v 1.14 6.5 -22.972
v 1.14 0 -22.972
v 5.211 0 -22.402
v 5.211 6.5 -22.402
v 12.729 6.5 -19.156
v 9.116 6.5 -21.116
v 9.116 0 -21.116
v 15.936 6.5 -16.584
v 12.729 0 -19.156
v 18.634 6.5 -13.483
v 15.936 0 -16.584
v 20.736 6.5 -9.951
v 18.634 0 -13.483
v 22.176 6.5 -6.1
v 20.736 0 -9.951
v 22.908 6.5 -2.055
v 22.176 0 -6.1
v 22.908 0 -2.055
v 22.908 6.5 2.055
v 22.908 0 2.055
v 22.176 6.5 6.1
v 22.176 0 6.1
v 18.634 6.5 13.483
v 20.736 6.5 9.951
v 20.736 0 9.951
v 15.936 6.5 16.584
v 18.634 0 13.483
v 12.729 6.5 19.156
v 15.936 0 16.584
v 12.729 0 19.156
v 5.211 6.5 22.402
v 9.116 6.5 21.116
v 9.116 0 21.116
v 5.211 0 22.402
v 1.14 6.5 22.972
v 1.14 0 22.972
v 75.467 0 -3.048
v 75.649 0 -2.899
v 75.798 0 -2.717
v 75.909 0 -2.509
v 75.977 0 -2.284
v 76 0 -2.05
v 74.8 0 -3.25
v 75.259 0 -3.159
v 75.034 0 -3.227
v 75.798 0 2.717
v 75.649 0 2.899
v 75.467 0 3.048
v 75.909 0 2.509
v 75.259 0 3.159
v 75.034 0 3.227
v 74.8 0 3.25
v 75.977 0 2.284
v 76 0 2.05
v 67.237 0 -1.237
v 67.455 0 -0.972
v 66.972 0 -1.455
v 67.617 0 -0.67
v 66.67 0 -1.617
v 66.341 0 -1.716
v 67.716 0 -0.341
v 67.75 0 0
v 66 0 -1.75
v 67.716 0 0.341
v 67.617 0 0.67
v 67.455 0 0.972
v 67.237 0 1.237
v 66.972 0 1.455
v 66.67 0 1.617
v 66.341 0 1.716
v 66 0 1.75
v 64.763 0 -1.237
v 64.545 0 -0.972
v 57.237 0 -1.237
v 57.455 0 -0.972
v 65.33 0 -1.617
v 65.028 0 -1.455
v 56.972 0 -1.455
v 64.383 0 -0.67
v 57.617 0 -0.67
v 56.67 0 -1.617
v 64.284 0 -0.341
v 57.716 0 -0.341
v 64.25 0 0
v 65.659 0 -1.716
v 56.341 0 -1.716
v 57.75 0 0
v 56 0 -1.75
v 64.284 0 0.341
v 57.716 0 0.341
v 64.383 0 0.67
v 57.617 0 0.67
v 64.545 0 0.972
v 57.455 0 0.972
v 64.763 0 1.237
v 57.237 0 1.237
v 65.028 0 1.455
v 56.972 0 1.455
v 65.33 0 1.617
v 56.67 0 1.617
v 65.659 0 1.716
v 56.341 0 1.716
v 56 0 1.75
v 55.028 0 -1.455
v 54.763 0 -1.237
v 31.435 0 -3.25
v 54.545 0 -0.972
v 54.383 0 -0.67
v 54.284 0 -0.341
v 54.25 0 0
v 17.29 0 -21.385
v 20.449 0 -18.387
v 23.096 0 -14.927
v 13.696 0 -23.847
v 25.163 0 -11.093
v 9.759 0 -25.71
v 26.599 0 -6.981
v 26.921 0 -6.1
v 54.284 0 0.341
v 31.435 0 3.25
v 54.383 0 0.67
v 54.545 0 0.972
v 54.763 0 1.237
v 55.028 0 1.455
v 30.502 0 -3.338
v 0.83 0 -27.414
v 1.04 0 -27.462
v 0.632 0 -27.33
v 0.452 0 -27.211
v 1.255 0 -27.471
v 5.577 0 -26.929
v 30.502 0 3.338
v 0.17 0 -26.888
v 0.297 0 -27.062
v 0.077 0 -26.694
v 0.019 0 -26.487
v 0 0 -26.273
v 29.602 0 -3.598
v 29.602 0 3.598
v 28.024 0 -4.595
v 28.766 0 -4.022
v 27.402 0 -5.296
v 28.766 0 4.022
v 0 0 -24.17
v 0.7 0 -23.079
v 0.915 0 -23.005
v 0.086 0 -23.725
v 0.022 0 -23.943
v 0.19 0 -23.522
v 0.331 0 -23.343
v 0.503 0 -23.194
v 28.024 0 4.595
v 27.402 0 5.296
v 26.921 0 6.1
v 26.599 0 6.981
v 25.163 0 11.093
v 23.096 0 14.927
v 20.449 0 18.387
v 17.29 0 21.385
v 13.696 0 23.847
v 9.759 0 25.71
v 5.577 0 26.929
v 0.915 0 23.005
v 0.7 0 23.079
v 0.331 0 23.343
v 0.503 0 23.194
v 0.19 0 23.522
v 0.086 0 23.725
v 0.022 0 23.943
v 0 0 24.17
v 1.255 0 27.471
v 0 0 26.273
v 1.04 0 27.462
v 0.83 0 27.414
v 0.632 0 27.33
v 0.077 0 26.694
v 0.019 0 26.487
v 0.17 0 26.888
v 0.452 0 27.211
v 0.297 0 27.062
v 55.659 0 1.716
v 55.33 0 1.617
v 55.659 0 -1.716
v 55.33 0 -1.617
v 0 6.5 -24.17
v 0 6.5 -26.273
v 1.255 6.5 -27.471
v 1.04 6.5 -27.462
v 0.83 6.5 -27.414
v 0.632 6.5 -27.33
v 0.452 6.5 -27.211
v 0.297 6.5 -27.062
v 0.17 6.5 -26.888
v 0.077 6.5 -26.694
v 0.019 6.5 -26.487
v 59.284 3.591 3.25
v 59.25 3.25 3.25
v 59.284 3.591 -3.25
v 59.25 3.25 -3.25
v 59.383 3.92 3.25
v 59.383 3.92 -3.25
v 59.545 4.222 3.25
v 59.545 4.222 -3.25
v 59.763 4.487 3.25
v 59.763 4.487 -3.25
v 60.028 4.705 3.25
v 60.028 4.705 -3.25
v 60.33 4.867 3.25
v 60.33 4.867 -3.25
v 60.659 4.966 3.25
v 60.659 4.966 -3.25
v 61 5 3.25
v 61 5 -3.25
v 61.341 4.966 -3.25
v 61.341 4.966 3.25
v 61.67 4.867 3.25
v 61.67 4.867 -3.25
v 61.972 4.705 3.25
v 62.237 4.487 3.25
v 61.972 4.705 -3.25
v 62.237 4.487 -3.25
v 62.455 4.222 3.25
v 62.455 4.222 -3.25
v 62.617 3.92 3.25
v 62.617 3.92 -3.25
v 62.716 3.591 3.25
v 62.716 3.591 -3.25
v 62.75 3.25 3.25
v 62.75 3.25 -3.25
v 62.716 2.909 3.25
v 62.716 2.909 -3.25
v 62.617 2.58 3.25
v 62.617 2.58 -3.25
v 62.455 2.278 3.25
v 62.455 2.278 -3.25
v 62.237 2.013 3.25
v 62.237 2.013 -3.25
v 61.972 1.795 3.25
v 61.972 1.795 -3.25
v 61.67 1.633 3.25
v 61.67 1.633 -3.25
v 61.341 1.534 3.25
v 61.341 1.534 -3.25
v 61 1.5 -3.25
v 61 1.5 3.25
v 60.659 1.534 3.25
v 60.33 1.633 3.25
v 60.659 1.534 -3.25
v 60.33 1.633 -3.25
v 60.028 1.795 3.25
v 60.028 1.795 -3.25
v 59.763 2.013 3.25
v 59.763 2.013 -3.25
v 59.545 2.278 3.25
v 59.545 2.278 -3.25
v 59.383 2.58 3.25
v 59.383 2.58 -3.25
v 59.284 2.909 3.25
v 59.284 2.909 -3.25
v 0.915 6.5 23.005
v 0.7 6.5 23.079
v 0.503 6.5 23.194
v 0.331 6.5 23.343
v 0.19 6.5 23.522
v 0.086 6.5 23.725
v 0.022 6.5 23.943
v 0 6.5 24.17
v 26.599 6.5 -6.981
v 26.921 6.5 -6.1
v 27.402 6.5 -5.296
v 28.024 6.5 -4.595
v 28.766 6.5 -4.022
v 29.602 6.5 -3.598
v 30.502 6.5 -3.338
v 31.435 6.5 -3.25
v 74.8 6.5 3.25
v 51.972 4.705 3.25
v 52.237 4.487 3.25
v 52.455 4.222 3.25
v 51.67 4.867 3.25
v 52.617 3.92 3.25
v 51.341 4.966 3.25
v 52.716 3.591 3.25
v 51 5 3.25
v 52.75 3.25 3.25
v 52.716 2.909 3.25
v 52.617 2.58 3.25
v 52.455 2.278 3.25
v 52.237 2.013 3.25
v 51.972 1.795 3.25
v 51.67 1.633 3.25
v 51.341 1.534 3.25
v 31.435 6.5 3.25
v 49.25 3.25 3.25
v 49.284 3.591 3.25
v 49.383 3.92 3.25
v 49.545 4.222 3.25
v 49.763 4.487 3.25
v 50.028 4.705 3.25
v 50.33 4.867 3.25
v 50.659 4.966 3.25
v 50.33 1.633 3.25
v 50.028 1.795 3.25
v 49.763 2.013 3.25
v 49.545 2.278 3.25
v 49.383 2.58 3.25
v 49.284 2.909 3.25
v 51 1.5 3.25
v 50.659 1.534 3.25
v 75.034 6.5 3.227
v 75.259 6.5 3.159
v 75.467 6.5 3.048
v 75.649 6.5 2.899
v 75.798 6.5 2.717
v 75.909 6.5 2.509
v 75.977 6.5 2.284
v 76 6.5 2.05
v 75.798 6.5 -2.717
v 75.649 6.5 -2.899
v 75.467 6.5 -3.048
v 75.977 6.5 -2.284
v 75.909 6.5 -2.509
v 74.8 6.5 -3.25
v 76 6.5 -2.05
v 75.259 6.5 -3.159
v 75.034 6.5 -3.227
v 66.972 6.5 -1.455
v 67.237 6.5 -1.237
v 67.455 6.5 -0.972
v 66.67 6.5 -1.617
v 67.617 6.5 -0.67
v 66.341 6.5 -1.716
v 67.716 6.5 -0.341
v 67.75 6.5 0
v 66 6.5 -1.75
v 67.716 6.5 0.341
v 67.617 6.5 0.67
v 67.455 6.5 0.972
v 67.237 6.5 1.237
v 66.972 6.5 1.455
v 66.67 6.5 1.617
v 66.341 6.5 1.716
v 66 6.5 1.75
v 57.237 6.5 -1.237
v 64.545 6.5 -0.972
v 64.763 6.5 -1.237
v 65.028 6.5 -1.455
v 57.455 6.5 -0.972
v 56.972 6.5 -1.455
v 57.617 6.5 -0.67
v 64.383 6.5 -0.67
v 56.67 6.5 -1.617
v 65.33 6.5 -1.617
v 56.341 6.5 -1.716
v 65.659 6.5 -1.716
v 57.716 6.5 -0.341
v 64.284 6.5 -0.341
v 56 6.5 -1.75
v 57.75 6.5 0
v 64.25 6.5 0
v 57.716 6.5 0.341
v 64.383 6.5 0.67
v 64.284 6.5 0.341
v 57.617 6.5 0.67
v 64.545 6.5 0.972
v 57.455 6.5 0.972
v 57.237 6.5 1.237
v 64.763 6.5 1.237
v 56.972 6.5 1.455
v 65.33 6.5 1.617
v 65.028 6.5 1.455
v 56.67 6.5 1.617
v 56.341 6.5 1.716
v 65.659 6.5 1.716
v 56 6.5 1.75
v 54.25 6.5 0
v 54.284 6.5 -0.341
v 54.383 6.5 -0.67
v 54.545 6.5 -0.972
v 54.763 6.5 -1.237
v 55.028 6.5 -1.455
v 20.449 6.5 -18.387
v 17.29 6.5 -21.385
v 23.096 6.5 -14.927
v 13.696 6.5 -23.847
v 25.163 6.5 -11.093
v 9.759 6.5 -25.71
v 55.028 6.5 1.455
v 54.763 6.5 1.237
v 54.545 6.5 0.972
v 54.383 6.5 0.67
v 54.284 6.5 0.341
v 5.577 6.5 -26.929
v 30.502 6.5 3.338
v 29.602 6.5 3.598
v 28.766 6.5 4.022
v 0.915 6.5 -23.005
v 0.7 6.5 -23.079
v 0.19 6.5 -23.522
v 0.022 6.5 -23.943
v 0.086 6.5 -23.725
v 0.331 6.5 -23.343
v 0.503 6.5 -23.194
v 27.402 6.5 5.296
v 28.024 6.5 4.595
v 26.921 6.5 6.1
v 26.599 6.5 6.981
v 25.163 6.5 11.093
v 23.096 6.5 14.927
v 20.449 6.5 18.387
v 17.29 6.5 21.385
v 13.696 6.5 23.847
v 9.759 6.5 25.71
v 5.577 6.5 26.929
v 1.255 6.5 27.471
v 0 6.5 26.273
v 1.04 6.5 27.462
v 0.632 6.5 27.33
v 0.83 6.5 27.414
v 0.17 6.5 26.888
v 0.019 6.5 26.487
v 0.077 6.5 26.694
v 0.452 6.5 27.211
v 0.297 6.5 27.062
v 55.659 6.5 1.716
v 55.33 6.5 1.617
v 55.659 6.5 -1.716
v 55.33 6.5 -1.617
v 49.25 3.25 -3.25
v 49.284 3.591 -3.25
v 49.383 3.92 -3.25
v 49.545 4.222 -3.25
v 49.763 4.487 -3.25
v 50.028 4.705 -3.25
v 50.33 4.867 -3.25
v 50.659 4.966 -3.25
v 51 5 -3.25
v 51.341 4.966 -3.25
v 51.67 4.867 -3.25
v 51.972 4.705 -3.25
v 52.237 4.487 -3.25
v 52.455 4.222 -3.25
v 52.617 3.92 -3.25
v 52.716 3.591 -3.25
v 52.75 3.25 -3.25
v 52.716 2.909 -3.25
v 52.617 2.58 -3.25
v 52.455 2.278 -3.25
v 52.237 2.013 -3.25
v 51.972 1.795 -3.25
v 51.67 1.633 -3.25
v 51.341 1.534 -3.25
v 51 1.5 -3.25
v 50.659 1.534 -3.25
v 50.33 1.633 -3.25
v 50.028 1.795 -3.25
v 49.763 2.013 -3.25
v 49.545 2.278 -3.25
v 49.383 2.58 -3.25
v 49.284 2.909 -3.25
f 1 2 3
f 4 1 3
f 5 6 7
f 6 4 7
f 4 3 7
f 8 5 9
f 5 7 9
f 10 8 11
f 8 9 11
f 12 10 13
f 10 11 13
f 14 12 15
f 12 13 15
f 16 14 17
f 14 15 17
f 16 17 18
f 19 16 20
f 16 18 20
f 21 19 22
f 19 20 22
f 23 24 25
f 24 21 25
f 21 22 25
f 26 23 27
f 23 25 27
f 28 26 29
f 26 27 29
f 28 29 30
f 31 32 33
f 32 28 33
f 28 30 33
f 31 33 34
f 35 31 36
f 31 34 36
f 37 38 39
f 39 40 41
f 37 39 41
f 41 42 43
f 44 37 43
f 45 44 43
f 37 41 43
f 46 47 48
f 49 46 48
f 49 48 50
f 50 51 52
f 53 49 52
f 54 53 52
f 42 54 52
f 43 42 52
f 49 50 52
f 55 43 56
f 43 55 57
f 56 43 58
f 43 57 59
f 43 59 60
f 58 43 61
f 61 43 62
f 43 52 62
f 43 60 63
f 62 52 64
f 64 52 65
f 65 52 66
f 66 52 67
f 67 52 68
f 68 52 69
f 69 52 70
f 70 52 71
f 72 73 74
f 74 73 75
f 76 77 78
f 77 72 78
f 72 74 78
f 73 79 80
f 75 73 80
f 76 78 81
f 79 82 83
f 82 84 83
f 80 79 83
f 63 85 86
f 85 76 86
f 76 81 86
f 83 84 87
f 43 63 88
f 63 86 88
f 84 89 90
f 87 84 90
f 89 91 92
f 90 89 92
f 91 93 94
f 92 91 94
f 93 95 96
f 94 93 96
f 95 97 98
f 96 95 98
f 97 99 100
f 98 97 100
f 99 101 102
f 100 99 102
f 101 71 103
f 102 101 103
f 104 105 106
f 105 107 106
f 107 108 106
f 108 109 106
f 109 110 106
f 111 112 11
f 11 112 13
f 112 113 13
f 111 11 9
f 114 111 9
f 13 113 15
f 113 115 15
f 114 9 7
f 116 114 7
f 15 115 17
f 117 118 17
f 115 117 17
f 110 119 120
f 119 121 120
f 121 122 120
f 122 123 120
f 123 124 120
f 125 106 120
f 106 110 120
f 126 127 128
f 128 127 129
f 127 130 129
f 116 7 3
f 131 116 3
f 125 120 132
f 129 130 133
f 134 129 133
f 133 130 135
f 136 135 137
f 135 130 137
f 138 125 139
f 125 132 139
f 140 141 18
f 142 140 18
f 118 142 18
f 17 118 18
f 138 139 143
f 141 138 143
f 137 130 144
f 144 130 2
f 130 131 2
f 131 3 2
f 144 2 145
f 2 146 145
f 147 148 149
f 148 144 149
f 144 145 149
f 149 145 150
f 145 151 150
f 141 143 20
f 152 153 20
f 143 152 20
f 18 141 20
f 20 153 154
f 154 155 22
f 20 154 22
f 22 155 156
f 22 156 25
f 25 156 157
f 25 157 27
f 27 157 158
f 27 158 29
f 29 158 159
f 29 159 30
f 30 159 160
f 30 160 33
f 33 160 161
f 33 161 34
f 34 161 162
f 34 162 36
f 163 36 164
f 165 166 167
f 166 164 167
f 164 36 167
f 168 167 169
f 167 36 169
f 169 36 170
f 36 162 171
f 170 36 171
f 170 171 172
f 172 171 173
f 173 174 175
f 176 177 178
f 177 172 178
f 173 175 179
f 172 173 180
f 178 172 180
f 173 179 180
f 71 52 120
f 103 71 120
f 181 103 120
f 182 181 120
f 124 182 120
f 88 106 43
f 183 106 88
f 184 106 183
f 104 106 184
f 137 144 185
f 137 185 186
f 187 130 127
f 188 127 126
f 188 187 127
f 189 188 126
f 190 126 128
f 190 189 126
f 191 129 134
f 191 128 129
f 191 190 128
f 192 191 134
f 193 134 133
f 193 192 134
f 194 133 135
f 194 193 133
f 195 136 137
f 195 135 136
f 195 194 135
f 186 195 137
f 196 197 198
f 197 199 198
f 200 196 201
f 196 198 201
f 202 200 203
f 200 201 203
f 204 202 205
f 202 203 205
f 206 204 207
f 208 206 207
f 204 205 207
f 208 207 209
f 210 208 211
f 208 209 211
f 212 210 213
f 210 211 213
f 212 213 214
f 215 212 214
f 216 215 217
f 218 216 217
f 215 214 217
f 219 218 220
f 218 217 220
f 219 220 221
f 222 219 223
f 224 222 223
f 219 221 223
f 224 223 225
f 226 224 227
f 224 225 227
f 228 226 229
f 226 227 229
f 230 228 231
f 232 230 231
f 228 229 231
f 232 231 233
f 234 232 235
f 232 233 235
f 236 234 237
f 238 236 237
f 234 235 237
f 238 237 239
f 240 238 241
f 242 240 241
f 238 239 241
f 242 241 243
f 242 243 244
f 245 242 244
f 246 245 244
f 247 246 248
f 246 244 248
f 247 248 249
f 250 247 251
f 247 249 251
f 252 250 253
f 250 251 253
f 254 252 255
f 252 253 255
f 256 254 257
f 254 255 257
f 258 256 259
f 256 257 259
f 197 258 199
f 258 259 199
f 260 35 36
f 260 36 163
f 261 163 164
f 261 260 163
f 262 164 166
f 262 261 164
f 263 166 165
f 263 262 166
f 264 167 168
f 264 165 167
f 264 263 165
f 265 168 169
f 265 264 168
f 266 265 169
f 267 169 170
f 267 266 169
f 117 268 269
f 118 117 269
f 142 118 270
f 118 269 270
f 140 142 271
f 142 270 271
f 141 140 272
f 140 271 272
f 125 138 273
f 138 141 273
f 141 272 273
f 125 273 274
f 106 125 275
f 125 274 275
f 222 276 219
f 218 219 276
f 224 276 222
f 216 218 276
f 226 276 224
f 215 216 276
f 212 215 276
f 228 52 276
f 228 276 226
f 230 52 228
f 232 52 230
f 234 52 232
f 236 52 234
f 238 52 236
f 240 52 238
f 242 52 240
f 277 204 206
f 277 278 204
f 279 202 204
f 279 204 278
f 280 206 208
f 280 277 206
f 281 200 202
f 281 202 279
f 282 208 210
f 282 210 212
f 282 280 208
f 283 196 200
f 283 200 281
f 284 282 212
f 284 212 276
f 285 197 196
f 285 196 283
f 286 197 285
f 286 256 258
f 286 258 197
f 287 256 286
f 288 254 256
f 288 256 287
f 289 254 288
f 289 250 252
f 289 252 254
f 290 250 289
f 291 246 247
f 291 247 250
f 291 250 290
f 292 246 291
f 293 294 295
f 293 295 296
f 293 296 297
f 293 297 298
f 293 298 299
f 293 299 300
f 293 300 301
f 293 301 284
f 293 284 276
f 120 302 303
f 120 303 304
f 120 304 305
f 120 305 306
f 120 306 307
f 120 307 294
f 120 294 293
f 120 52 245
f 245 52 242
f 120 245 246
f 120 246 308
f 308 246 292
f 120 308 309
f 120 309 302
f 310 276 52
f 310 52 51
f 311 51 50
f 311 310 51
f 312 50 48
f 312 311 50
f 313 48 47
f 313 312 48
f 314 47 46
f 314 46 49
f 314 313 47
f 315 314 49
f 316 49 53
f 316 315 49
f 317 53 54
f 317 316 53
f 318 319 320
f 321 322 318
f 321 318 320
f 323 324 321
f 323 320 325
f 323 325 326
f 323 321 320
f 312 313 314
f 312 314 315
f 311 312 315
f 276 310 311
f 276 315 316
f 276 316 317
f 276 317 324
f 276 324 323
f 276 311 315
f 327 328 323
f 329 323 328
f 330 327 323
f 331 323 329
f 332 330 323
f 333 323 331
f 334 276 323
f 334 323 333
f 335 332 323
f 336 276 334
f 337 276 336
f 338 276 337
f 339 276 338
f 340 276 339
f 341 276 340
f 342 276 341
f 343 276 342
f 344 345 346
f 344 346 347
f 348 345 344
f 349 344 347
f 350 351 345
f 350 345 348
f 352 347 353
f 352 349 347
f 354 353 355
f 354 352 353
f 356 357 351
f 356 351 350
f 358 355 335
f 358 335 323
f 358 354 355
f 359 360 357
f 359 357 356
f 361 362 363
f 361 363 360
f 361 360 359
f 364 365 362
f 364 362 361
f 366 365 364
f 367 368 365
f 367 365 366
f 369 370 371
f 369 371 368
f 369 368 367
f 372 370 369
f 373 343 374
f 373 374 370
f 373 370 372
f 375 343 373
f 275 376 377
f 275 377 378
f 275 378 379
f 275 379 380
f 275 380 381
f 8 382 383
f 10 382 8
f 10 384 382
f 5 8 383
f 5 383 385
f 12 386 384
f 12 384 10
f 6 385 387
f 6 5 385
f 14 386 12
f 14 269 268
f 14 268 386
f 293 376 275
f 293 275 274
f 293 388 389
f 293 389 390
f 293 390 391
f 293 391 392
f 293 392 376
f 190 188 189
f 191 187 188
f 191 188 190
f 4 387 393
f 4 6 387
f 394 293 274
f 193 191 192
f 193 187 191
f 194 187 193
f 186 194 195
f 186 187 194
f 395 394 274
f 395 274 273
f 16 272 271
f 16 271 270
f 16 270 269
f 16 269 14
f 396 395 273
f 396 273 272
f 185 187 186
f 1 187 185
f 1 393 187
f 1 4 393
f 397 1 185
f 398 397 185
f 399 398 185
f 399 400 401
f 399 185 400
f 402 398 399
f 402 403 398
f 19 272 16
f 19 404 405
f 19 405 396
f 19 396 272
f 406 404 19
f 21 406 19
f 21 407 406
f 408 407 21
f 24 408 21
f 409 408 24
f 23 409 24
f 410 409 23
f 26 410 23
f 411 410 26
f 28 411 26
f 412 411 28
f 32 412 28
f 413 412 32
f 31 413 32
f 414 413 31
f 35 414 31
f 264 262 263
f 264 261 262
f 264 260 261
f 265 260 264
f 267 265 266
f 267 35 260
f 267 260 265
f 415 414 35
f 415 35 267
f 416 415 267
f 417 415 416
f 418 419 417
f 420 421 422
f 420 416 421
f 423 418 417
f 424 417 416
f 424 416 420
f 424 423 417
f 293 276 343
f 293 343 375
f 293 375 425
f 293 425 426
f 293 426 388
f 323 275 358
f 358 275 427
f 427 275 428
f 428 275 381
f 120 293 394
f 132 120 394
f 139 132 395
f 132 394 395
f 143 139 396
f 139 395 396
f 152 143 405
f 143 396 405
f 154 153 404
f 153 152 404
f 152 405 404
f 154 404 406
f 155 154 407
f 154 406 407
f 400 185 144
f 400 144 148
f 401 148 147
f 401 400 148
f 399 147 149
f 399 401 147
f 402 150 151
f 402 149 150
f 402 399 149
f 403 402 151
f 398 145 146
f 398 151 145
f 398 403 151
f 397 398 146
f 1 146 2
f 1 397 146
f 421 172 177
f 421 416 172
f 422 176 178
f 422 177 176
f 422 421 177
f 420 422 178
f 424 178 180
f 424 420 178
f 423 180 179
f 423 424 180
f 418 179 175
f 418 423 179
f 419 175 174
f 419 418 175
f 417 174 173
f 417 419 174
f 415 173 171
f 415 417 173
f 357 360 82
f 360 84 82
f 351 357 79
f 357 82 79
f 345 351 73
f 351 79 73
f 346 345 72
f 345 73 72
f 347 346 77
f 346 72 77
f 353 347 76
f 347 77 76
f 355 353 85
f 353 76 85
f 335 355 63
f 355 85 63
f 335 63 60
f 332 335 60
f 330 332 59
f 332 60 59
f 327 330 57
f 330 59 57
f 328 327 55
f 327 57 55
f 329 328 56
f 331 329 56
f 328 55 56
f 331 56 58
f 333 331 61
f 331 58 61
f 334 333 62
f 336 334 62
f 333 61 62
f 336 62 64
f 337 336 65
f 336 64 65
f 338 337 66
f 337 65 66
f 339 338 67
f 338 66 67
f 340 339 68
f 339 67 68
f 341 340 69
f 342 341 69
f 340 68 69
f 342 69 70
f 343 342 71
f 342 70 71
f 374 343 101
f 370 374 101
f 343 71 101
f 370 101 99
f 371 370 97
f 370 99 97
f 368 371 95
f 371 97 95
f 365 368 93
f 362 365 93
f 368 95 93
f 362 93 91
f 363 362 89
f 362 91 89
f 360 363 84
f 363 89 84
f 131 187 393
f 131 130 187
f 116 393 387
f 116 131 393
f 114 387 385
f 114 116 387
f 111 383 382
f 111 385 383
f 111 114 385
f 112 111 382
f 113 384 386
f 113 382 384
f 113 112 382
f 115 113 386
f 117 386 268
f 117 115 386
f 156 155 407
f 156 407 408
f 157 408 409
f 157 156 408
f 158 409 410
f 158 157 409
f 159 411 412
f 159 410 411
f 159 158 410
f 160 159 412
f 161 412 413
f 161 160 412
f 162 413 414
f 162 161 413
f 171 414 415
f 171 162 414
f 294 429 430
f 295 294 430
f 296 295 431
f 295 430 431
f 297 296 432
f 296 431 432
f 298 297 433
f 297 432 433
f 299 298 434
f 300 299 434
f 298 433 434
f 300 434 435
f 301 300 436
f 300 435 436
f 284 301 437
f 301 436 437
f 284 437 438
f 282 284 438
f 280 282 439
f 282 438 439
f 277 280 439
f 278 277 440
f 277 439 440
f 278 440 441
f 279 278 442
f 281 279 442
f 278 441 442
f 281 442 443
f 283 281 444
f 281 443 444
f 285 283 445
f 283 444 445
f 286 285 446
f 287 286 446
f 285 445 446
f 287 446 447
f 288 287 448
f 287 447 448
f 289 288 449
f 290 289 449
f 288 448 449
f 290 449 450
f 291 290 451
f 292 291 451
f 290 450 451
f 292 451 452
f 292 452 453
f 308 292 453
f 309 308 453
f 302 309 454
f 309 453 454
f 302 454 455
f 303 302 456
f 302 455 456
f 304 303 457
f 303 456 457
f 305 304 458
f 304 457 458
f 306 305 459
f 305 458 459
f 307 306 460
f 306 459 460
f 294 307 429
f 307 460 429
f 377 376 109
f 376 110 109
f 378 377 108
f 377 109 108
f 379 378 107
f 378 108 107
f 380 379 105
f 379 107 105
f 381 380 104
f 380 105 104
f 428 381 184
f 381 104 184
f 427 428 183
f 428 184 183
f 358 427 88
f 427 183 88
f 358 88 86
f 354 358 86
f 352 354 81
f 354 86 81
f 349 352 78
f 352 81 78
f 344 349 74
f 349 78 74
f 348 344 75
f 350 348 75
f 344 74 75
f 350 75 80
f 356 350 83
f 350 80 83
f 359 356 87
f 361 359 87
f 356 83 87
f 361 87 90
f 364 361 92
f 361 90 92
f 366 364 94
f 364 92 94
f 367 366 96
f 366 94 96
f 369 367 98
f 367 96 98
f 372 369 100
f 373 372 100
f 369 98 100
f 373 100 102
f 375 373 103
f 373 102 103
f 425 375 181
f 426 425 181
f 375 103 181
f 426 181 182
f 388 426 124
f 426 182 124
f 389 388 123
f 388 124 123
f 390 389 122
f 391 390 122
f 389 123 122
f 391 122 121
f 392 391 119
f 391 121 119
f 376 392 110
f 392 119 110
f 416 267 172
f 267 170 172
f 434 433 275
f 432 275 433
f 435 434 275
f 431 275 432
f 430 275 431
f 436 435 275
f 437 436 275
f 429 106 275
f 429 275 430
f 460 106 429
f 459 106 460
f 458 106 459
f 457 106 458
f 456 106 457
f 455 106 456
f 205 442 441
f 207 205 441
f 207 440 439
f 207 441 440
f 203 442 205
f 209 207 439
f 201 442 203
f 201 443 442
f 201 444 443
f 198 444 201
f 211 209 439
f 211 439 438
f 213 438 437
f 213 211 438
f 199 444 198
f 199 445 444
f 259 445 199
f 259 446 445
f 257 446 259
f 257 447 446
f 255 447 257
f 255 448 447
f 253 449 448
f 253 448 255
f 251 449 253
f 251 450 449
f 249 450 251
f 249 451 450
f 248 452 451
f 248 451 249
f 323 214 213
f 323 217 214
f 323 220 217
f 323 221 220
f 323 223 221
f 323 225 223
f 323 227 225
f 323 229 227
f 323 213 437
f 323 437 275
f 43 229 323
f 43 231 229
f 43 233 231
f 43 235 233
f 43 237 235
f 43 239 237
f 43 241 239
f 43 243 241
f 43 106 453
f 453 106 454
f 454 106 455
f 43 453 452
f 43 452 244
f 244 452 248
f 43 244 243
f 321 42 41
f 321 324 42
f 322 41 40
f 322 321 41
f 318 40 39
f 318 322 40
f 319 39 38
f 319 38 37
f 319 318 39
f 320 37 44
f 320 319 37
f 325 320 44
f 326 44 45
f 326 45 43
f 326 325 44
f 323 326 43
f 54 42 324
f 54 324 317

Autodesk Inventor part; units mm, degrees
ref_plane "YZ Plane" through (0, 0, 0) normal (1, 0, 0) x (0, 1, 0)
ref_plane "XZ Plane" through (0, 0, 0) normal (0, 1, 0) x (-1, 0, 0)
ref_plane "XY Plane" through (0, 0, 0) normal (0, 0, 1) x (1, 0, 0)
sketch "Szkic1" plane through (0, 0, 0) normal (0, 1, 0) x (-1, 0, 0)
  circle A0 centre (0, 0) radius 23 construction
  arc A1 (0, 23) -> (0, -23) centre (0, 0) ccw
  line L0 (0, 23) -> (0, 27.5)
  line L1 (0, -23) -> (0, -27.5)
  line L2 (0, -38.5) -> (0, 38.5) projected
  arc A2 (0, 27.5) -> (0, -27.5) centre (0, 0) ccw
  line L3 (-76, 3.25) -> (-27.3073, 3.25)
  line L4 (-27.3073, 3.25) -> (-27.3073, -3.25) construction
  line L5 (-27.3073, -3.25) -> (-76, -3.25)
  line L6 (-76, -3.25) -> (-76, 3.25)
  line L7 (42.8, 0) -> (-95.8, 0) projected
  circle A3 centre (-66, 0) radius 1.75
  circle A4 centre (-56, 0) radius 1.75
  point P0 (-27.5, 0)
  point P1 (-23, 0)
  dimension "d0" = 46
  dimension "d1" = 4.5
  dimension "d2" = 4.5
  dimension "d3" = 6.5
  dimension "d4" = 76
  dimension "d5" = 3.5
  dimension "d6" = 10
  dimension "d7" = 10
extrude "Wyciągnięcie proste1" add sketch "Szkic1" along normal blind 6.5 contours A1 L7 A2 L0 | A1 L1 A2 L7 | L7 A4 A3 L6 L3 A2 | A2 L5 L6 L7 A3 A4
sketch "Szkic2" plane through (76, 0, -3.25) normal (0, 0, -1) x (-1, 0, 0)
  line L0 (0, 0) -> (48.6927, 0) projected
  line L1 (48.6927, 0) -> (48.6927, 6.5) projected
  line L2 (0, 6.5) -> (48.6927, 6.5) projected
  line L3 (0, 0) -> (0, 6.5) projected
  line L4 (48.6927, 0) -> (48.6927, 6.5) projected
  line L5 (48.6927, 3.25) -> (0, 3.25) construction
  circle A0 centre (15, 3.25) radius 1.75
  circle A1 centre (25, 3.25) radius 1.75
  point P0 (76, 0)
  dimension "d10" = 3.5
  dimension "d11" = 3.5
  dimension "d12" = 15
  dimension "d13" = 10
extrude "Wyciągnięcie proste2" cut sketch "Szkic2" against normal up to surface (6.5 mm away) contours A0 | A1
fillet "Zaokrąglenie1" radius 5 2 edges at (27.3073, 3.25, 3.25) (27.3073, 3.25, -3.25)
fillet "Zaokrąglenie2" radius 1.2 6 edges at (0, 3.25, 27.5) (0, 3.25, 23) (0, 3.25, -23) (0, 3.25, -27.5) (76, 3.25, 3.25) (76, 3.25, -3.25)
equation "\"d2\" = d1"
equation "\"d8\" = d3"
equation "\"d14\" = d3"
properties part number "stojak"
